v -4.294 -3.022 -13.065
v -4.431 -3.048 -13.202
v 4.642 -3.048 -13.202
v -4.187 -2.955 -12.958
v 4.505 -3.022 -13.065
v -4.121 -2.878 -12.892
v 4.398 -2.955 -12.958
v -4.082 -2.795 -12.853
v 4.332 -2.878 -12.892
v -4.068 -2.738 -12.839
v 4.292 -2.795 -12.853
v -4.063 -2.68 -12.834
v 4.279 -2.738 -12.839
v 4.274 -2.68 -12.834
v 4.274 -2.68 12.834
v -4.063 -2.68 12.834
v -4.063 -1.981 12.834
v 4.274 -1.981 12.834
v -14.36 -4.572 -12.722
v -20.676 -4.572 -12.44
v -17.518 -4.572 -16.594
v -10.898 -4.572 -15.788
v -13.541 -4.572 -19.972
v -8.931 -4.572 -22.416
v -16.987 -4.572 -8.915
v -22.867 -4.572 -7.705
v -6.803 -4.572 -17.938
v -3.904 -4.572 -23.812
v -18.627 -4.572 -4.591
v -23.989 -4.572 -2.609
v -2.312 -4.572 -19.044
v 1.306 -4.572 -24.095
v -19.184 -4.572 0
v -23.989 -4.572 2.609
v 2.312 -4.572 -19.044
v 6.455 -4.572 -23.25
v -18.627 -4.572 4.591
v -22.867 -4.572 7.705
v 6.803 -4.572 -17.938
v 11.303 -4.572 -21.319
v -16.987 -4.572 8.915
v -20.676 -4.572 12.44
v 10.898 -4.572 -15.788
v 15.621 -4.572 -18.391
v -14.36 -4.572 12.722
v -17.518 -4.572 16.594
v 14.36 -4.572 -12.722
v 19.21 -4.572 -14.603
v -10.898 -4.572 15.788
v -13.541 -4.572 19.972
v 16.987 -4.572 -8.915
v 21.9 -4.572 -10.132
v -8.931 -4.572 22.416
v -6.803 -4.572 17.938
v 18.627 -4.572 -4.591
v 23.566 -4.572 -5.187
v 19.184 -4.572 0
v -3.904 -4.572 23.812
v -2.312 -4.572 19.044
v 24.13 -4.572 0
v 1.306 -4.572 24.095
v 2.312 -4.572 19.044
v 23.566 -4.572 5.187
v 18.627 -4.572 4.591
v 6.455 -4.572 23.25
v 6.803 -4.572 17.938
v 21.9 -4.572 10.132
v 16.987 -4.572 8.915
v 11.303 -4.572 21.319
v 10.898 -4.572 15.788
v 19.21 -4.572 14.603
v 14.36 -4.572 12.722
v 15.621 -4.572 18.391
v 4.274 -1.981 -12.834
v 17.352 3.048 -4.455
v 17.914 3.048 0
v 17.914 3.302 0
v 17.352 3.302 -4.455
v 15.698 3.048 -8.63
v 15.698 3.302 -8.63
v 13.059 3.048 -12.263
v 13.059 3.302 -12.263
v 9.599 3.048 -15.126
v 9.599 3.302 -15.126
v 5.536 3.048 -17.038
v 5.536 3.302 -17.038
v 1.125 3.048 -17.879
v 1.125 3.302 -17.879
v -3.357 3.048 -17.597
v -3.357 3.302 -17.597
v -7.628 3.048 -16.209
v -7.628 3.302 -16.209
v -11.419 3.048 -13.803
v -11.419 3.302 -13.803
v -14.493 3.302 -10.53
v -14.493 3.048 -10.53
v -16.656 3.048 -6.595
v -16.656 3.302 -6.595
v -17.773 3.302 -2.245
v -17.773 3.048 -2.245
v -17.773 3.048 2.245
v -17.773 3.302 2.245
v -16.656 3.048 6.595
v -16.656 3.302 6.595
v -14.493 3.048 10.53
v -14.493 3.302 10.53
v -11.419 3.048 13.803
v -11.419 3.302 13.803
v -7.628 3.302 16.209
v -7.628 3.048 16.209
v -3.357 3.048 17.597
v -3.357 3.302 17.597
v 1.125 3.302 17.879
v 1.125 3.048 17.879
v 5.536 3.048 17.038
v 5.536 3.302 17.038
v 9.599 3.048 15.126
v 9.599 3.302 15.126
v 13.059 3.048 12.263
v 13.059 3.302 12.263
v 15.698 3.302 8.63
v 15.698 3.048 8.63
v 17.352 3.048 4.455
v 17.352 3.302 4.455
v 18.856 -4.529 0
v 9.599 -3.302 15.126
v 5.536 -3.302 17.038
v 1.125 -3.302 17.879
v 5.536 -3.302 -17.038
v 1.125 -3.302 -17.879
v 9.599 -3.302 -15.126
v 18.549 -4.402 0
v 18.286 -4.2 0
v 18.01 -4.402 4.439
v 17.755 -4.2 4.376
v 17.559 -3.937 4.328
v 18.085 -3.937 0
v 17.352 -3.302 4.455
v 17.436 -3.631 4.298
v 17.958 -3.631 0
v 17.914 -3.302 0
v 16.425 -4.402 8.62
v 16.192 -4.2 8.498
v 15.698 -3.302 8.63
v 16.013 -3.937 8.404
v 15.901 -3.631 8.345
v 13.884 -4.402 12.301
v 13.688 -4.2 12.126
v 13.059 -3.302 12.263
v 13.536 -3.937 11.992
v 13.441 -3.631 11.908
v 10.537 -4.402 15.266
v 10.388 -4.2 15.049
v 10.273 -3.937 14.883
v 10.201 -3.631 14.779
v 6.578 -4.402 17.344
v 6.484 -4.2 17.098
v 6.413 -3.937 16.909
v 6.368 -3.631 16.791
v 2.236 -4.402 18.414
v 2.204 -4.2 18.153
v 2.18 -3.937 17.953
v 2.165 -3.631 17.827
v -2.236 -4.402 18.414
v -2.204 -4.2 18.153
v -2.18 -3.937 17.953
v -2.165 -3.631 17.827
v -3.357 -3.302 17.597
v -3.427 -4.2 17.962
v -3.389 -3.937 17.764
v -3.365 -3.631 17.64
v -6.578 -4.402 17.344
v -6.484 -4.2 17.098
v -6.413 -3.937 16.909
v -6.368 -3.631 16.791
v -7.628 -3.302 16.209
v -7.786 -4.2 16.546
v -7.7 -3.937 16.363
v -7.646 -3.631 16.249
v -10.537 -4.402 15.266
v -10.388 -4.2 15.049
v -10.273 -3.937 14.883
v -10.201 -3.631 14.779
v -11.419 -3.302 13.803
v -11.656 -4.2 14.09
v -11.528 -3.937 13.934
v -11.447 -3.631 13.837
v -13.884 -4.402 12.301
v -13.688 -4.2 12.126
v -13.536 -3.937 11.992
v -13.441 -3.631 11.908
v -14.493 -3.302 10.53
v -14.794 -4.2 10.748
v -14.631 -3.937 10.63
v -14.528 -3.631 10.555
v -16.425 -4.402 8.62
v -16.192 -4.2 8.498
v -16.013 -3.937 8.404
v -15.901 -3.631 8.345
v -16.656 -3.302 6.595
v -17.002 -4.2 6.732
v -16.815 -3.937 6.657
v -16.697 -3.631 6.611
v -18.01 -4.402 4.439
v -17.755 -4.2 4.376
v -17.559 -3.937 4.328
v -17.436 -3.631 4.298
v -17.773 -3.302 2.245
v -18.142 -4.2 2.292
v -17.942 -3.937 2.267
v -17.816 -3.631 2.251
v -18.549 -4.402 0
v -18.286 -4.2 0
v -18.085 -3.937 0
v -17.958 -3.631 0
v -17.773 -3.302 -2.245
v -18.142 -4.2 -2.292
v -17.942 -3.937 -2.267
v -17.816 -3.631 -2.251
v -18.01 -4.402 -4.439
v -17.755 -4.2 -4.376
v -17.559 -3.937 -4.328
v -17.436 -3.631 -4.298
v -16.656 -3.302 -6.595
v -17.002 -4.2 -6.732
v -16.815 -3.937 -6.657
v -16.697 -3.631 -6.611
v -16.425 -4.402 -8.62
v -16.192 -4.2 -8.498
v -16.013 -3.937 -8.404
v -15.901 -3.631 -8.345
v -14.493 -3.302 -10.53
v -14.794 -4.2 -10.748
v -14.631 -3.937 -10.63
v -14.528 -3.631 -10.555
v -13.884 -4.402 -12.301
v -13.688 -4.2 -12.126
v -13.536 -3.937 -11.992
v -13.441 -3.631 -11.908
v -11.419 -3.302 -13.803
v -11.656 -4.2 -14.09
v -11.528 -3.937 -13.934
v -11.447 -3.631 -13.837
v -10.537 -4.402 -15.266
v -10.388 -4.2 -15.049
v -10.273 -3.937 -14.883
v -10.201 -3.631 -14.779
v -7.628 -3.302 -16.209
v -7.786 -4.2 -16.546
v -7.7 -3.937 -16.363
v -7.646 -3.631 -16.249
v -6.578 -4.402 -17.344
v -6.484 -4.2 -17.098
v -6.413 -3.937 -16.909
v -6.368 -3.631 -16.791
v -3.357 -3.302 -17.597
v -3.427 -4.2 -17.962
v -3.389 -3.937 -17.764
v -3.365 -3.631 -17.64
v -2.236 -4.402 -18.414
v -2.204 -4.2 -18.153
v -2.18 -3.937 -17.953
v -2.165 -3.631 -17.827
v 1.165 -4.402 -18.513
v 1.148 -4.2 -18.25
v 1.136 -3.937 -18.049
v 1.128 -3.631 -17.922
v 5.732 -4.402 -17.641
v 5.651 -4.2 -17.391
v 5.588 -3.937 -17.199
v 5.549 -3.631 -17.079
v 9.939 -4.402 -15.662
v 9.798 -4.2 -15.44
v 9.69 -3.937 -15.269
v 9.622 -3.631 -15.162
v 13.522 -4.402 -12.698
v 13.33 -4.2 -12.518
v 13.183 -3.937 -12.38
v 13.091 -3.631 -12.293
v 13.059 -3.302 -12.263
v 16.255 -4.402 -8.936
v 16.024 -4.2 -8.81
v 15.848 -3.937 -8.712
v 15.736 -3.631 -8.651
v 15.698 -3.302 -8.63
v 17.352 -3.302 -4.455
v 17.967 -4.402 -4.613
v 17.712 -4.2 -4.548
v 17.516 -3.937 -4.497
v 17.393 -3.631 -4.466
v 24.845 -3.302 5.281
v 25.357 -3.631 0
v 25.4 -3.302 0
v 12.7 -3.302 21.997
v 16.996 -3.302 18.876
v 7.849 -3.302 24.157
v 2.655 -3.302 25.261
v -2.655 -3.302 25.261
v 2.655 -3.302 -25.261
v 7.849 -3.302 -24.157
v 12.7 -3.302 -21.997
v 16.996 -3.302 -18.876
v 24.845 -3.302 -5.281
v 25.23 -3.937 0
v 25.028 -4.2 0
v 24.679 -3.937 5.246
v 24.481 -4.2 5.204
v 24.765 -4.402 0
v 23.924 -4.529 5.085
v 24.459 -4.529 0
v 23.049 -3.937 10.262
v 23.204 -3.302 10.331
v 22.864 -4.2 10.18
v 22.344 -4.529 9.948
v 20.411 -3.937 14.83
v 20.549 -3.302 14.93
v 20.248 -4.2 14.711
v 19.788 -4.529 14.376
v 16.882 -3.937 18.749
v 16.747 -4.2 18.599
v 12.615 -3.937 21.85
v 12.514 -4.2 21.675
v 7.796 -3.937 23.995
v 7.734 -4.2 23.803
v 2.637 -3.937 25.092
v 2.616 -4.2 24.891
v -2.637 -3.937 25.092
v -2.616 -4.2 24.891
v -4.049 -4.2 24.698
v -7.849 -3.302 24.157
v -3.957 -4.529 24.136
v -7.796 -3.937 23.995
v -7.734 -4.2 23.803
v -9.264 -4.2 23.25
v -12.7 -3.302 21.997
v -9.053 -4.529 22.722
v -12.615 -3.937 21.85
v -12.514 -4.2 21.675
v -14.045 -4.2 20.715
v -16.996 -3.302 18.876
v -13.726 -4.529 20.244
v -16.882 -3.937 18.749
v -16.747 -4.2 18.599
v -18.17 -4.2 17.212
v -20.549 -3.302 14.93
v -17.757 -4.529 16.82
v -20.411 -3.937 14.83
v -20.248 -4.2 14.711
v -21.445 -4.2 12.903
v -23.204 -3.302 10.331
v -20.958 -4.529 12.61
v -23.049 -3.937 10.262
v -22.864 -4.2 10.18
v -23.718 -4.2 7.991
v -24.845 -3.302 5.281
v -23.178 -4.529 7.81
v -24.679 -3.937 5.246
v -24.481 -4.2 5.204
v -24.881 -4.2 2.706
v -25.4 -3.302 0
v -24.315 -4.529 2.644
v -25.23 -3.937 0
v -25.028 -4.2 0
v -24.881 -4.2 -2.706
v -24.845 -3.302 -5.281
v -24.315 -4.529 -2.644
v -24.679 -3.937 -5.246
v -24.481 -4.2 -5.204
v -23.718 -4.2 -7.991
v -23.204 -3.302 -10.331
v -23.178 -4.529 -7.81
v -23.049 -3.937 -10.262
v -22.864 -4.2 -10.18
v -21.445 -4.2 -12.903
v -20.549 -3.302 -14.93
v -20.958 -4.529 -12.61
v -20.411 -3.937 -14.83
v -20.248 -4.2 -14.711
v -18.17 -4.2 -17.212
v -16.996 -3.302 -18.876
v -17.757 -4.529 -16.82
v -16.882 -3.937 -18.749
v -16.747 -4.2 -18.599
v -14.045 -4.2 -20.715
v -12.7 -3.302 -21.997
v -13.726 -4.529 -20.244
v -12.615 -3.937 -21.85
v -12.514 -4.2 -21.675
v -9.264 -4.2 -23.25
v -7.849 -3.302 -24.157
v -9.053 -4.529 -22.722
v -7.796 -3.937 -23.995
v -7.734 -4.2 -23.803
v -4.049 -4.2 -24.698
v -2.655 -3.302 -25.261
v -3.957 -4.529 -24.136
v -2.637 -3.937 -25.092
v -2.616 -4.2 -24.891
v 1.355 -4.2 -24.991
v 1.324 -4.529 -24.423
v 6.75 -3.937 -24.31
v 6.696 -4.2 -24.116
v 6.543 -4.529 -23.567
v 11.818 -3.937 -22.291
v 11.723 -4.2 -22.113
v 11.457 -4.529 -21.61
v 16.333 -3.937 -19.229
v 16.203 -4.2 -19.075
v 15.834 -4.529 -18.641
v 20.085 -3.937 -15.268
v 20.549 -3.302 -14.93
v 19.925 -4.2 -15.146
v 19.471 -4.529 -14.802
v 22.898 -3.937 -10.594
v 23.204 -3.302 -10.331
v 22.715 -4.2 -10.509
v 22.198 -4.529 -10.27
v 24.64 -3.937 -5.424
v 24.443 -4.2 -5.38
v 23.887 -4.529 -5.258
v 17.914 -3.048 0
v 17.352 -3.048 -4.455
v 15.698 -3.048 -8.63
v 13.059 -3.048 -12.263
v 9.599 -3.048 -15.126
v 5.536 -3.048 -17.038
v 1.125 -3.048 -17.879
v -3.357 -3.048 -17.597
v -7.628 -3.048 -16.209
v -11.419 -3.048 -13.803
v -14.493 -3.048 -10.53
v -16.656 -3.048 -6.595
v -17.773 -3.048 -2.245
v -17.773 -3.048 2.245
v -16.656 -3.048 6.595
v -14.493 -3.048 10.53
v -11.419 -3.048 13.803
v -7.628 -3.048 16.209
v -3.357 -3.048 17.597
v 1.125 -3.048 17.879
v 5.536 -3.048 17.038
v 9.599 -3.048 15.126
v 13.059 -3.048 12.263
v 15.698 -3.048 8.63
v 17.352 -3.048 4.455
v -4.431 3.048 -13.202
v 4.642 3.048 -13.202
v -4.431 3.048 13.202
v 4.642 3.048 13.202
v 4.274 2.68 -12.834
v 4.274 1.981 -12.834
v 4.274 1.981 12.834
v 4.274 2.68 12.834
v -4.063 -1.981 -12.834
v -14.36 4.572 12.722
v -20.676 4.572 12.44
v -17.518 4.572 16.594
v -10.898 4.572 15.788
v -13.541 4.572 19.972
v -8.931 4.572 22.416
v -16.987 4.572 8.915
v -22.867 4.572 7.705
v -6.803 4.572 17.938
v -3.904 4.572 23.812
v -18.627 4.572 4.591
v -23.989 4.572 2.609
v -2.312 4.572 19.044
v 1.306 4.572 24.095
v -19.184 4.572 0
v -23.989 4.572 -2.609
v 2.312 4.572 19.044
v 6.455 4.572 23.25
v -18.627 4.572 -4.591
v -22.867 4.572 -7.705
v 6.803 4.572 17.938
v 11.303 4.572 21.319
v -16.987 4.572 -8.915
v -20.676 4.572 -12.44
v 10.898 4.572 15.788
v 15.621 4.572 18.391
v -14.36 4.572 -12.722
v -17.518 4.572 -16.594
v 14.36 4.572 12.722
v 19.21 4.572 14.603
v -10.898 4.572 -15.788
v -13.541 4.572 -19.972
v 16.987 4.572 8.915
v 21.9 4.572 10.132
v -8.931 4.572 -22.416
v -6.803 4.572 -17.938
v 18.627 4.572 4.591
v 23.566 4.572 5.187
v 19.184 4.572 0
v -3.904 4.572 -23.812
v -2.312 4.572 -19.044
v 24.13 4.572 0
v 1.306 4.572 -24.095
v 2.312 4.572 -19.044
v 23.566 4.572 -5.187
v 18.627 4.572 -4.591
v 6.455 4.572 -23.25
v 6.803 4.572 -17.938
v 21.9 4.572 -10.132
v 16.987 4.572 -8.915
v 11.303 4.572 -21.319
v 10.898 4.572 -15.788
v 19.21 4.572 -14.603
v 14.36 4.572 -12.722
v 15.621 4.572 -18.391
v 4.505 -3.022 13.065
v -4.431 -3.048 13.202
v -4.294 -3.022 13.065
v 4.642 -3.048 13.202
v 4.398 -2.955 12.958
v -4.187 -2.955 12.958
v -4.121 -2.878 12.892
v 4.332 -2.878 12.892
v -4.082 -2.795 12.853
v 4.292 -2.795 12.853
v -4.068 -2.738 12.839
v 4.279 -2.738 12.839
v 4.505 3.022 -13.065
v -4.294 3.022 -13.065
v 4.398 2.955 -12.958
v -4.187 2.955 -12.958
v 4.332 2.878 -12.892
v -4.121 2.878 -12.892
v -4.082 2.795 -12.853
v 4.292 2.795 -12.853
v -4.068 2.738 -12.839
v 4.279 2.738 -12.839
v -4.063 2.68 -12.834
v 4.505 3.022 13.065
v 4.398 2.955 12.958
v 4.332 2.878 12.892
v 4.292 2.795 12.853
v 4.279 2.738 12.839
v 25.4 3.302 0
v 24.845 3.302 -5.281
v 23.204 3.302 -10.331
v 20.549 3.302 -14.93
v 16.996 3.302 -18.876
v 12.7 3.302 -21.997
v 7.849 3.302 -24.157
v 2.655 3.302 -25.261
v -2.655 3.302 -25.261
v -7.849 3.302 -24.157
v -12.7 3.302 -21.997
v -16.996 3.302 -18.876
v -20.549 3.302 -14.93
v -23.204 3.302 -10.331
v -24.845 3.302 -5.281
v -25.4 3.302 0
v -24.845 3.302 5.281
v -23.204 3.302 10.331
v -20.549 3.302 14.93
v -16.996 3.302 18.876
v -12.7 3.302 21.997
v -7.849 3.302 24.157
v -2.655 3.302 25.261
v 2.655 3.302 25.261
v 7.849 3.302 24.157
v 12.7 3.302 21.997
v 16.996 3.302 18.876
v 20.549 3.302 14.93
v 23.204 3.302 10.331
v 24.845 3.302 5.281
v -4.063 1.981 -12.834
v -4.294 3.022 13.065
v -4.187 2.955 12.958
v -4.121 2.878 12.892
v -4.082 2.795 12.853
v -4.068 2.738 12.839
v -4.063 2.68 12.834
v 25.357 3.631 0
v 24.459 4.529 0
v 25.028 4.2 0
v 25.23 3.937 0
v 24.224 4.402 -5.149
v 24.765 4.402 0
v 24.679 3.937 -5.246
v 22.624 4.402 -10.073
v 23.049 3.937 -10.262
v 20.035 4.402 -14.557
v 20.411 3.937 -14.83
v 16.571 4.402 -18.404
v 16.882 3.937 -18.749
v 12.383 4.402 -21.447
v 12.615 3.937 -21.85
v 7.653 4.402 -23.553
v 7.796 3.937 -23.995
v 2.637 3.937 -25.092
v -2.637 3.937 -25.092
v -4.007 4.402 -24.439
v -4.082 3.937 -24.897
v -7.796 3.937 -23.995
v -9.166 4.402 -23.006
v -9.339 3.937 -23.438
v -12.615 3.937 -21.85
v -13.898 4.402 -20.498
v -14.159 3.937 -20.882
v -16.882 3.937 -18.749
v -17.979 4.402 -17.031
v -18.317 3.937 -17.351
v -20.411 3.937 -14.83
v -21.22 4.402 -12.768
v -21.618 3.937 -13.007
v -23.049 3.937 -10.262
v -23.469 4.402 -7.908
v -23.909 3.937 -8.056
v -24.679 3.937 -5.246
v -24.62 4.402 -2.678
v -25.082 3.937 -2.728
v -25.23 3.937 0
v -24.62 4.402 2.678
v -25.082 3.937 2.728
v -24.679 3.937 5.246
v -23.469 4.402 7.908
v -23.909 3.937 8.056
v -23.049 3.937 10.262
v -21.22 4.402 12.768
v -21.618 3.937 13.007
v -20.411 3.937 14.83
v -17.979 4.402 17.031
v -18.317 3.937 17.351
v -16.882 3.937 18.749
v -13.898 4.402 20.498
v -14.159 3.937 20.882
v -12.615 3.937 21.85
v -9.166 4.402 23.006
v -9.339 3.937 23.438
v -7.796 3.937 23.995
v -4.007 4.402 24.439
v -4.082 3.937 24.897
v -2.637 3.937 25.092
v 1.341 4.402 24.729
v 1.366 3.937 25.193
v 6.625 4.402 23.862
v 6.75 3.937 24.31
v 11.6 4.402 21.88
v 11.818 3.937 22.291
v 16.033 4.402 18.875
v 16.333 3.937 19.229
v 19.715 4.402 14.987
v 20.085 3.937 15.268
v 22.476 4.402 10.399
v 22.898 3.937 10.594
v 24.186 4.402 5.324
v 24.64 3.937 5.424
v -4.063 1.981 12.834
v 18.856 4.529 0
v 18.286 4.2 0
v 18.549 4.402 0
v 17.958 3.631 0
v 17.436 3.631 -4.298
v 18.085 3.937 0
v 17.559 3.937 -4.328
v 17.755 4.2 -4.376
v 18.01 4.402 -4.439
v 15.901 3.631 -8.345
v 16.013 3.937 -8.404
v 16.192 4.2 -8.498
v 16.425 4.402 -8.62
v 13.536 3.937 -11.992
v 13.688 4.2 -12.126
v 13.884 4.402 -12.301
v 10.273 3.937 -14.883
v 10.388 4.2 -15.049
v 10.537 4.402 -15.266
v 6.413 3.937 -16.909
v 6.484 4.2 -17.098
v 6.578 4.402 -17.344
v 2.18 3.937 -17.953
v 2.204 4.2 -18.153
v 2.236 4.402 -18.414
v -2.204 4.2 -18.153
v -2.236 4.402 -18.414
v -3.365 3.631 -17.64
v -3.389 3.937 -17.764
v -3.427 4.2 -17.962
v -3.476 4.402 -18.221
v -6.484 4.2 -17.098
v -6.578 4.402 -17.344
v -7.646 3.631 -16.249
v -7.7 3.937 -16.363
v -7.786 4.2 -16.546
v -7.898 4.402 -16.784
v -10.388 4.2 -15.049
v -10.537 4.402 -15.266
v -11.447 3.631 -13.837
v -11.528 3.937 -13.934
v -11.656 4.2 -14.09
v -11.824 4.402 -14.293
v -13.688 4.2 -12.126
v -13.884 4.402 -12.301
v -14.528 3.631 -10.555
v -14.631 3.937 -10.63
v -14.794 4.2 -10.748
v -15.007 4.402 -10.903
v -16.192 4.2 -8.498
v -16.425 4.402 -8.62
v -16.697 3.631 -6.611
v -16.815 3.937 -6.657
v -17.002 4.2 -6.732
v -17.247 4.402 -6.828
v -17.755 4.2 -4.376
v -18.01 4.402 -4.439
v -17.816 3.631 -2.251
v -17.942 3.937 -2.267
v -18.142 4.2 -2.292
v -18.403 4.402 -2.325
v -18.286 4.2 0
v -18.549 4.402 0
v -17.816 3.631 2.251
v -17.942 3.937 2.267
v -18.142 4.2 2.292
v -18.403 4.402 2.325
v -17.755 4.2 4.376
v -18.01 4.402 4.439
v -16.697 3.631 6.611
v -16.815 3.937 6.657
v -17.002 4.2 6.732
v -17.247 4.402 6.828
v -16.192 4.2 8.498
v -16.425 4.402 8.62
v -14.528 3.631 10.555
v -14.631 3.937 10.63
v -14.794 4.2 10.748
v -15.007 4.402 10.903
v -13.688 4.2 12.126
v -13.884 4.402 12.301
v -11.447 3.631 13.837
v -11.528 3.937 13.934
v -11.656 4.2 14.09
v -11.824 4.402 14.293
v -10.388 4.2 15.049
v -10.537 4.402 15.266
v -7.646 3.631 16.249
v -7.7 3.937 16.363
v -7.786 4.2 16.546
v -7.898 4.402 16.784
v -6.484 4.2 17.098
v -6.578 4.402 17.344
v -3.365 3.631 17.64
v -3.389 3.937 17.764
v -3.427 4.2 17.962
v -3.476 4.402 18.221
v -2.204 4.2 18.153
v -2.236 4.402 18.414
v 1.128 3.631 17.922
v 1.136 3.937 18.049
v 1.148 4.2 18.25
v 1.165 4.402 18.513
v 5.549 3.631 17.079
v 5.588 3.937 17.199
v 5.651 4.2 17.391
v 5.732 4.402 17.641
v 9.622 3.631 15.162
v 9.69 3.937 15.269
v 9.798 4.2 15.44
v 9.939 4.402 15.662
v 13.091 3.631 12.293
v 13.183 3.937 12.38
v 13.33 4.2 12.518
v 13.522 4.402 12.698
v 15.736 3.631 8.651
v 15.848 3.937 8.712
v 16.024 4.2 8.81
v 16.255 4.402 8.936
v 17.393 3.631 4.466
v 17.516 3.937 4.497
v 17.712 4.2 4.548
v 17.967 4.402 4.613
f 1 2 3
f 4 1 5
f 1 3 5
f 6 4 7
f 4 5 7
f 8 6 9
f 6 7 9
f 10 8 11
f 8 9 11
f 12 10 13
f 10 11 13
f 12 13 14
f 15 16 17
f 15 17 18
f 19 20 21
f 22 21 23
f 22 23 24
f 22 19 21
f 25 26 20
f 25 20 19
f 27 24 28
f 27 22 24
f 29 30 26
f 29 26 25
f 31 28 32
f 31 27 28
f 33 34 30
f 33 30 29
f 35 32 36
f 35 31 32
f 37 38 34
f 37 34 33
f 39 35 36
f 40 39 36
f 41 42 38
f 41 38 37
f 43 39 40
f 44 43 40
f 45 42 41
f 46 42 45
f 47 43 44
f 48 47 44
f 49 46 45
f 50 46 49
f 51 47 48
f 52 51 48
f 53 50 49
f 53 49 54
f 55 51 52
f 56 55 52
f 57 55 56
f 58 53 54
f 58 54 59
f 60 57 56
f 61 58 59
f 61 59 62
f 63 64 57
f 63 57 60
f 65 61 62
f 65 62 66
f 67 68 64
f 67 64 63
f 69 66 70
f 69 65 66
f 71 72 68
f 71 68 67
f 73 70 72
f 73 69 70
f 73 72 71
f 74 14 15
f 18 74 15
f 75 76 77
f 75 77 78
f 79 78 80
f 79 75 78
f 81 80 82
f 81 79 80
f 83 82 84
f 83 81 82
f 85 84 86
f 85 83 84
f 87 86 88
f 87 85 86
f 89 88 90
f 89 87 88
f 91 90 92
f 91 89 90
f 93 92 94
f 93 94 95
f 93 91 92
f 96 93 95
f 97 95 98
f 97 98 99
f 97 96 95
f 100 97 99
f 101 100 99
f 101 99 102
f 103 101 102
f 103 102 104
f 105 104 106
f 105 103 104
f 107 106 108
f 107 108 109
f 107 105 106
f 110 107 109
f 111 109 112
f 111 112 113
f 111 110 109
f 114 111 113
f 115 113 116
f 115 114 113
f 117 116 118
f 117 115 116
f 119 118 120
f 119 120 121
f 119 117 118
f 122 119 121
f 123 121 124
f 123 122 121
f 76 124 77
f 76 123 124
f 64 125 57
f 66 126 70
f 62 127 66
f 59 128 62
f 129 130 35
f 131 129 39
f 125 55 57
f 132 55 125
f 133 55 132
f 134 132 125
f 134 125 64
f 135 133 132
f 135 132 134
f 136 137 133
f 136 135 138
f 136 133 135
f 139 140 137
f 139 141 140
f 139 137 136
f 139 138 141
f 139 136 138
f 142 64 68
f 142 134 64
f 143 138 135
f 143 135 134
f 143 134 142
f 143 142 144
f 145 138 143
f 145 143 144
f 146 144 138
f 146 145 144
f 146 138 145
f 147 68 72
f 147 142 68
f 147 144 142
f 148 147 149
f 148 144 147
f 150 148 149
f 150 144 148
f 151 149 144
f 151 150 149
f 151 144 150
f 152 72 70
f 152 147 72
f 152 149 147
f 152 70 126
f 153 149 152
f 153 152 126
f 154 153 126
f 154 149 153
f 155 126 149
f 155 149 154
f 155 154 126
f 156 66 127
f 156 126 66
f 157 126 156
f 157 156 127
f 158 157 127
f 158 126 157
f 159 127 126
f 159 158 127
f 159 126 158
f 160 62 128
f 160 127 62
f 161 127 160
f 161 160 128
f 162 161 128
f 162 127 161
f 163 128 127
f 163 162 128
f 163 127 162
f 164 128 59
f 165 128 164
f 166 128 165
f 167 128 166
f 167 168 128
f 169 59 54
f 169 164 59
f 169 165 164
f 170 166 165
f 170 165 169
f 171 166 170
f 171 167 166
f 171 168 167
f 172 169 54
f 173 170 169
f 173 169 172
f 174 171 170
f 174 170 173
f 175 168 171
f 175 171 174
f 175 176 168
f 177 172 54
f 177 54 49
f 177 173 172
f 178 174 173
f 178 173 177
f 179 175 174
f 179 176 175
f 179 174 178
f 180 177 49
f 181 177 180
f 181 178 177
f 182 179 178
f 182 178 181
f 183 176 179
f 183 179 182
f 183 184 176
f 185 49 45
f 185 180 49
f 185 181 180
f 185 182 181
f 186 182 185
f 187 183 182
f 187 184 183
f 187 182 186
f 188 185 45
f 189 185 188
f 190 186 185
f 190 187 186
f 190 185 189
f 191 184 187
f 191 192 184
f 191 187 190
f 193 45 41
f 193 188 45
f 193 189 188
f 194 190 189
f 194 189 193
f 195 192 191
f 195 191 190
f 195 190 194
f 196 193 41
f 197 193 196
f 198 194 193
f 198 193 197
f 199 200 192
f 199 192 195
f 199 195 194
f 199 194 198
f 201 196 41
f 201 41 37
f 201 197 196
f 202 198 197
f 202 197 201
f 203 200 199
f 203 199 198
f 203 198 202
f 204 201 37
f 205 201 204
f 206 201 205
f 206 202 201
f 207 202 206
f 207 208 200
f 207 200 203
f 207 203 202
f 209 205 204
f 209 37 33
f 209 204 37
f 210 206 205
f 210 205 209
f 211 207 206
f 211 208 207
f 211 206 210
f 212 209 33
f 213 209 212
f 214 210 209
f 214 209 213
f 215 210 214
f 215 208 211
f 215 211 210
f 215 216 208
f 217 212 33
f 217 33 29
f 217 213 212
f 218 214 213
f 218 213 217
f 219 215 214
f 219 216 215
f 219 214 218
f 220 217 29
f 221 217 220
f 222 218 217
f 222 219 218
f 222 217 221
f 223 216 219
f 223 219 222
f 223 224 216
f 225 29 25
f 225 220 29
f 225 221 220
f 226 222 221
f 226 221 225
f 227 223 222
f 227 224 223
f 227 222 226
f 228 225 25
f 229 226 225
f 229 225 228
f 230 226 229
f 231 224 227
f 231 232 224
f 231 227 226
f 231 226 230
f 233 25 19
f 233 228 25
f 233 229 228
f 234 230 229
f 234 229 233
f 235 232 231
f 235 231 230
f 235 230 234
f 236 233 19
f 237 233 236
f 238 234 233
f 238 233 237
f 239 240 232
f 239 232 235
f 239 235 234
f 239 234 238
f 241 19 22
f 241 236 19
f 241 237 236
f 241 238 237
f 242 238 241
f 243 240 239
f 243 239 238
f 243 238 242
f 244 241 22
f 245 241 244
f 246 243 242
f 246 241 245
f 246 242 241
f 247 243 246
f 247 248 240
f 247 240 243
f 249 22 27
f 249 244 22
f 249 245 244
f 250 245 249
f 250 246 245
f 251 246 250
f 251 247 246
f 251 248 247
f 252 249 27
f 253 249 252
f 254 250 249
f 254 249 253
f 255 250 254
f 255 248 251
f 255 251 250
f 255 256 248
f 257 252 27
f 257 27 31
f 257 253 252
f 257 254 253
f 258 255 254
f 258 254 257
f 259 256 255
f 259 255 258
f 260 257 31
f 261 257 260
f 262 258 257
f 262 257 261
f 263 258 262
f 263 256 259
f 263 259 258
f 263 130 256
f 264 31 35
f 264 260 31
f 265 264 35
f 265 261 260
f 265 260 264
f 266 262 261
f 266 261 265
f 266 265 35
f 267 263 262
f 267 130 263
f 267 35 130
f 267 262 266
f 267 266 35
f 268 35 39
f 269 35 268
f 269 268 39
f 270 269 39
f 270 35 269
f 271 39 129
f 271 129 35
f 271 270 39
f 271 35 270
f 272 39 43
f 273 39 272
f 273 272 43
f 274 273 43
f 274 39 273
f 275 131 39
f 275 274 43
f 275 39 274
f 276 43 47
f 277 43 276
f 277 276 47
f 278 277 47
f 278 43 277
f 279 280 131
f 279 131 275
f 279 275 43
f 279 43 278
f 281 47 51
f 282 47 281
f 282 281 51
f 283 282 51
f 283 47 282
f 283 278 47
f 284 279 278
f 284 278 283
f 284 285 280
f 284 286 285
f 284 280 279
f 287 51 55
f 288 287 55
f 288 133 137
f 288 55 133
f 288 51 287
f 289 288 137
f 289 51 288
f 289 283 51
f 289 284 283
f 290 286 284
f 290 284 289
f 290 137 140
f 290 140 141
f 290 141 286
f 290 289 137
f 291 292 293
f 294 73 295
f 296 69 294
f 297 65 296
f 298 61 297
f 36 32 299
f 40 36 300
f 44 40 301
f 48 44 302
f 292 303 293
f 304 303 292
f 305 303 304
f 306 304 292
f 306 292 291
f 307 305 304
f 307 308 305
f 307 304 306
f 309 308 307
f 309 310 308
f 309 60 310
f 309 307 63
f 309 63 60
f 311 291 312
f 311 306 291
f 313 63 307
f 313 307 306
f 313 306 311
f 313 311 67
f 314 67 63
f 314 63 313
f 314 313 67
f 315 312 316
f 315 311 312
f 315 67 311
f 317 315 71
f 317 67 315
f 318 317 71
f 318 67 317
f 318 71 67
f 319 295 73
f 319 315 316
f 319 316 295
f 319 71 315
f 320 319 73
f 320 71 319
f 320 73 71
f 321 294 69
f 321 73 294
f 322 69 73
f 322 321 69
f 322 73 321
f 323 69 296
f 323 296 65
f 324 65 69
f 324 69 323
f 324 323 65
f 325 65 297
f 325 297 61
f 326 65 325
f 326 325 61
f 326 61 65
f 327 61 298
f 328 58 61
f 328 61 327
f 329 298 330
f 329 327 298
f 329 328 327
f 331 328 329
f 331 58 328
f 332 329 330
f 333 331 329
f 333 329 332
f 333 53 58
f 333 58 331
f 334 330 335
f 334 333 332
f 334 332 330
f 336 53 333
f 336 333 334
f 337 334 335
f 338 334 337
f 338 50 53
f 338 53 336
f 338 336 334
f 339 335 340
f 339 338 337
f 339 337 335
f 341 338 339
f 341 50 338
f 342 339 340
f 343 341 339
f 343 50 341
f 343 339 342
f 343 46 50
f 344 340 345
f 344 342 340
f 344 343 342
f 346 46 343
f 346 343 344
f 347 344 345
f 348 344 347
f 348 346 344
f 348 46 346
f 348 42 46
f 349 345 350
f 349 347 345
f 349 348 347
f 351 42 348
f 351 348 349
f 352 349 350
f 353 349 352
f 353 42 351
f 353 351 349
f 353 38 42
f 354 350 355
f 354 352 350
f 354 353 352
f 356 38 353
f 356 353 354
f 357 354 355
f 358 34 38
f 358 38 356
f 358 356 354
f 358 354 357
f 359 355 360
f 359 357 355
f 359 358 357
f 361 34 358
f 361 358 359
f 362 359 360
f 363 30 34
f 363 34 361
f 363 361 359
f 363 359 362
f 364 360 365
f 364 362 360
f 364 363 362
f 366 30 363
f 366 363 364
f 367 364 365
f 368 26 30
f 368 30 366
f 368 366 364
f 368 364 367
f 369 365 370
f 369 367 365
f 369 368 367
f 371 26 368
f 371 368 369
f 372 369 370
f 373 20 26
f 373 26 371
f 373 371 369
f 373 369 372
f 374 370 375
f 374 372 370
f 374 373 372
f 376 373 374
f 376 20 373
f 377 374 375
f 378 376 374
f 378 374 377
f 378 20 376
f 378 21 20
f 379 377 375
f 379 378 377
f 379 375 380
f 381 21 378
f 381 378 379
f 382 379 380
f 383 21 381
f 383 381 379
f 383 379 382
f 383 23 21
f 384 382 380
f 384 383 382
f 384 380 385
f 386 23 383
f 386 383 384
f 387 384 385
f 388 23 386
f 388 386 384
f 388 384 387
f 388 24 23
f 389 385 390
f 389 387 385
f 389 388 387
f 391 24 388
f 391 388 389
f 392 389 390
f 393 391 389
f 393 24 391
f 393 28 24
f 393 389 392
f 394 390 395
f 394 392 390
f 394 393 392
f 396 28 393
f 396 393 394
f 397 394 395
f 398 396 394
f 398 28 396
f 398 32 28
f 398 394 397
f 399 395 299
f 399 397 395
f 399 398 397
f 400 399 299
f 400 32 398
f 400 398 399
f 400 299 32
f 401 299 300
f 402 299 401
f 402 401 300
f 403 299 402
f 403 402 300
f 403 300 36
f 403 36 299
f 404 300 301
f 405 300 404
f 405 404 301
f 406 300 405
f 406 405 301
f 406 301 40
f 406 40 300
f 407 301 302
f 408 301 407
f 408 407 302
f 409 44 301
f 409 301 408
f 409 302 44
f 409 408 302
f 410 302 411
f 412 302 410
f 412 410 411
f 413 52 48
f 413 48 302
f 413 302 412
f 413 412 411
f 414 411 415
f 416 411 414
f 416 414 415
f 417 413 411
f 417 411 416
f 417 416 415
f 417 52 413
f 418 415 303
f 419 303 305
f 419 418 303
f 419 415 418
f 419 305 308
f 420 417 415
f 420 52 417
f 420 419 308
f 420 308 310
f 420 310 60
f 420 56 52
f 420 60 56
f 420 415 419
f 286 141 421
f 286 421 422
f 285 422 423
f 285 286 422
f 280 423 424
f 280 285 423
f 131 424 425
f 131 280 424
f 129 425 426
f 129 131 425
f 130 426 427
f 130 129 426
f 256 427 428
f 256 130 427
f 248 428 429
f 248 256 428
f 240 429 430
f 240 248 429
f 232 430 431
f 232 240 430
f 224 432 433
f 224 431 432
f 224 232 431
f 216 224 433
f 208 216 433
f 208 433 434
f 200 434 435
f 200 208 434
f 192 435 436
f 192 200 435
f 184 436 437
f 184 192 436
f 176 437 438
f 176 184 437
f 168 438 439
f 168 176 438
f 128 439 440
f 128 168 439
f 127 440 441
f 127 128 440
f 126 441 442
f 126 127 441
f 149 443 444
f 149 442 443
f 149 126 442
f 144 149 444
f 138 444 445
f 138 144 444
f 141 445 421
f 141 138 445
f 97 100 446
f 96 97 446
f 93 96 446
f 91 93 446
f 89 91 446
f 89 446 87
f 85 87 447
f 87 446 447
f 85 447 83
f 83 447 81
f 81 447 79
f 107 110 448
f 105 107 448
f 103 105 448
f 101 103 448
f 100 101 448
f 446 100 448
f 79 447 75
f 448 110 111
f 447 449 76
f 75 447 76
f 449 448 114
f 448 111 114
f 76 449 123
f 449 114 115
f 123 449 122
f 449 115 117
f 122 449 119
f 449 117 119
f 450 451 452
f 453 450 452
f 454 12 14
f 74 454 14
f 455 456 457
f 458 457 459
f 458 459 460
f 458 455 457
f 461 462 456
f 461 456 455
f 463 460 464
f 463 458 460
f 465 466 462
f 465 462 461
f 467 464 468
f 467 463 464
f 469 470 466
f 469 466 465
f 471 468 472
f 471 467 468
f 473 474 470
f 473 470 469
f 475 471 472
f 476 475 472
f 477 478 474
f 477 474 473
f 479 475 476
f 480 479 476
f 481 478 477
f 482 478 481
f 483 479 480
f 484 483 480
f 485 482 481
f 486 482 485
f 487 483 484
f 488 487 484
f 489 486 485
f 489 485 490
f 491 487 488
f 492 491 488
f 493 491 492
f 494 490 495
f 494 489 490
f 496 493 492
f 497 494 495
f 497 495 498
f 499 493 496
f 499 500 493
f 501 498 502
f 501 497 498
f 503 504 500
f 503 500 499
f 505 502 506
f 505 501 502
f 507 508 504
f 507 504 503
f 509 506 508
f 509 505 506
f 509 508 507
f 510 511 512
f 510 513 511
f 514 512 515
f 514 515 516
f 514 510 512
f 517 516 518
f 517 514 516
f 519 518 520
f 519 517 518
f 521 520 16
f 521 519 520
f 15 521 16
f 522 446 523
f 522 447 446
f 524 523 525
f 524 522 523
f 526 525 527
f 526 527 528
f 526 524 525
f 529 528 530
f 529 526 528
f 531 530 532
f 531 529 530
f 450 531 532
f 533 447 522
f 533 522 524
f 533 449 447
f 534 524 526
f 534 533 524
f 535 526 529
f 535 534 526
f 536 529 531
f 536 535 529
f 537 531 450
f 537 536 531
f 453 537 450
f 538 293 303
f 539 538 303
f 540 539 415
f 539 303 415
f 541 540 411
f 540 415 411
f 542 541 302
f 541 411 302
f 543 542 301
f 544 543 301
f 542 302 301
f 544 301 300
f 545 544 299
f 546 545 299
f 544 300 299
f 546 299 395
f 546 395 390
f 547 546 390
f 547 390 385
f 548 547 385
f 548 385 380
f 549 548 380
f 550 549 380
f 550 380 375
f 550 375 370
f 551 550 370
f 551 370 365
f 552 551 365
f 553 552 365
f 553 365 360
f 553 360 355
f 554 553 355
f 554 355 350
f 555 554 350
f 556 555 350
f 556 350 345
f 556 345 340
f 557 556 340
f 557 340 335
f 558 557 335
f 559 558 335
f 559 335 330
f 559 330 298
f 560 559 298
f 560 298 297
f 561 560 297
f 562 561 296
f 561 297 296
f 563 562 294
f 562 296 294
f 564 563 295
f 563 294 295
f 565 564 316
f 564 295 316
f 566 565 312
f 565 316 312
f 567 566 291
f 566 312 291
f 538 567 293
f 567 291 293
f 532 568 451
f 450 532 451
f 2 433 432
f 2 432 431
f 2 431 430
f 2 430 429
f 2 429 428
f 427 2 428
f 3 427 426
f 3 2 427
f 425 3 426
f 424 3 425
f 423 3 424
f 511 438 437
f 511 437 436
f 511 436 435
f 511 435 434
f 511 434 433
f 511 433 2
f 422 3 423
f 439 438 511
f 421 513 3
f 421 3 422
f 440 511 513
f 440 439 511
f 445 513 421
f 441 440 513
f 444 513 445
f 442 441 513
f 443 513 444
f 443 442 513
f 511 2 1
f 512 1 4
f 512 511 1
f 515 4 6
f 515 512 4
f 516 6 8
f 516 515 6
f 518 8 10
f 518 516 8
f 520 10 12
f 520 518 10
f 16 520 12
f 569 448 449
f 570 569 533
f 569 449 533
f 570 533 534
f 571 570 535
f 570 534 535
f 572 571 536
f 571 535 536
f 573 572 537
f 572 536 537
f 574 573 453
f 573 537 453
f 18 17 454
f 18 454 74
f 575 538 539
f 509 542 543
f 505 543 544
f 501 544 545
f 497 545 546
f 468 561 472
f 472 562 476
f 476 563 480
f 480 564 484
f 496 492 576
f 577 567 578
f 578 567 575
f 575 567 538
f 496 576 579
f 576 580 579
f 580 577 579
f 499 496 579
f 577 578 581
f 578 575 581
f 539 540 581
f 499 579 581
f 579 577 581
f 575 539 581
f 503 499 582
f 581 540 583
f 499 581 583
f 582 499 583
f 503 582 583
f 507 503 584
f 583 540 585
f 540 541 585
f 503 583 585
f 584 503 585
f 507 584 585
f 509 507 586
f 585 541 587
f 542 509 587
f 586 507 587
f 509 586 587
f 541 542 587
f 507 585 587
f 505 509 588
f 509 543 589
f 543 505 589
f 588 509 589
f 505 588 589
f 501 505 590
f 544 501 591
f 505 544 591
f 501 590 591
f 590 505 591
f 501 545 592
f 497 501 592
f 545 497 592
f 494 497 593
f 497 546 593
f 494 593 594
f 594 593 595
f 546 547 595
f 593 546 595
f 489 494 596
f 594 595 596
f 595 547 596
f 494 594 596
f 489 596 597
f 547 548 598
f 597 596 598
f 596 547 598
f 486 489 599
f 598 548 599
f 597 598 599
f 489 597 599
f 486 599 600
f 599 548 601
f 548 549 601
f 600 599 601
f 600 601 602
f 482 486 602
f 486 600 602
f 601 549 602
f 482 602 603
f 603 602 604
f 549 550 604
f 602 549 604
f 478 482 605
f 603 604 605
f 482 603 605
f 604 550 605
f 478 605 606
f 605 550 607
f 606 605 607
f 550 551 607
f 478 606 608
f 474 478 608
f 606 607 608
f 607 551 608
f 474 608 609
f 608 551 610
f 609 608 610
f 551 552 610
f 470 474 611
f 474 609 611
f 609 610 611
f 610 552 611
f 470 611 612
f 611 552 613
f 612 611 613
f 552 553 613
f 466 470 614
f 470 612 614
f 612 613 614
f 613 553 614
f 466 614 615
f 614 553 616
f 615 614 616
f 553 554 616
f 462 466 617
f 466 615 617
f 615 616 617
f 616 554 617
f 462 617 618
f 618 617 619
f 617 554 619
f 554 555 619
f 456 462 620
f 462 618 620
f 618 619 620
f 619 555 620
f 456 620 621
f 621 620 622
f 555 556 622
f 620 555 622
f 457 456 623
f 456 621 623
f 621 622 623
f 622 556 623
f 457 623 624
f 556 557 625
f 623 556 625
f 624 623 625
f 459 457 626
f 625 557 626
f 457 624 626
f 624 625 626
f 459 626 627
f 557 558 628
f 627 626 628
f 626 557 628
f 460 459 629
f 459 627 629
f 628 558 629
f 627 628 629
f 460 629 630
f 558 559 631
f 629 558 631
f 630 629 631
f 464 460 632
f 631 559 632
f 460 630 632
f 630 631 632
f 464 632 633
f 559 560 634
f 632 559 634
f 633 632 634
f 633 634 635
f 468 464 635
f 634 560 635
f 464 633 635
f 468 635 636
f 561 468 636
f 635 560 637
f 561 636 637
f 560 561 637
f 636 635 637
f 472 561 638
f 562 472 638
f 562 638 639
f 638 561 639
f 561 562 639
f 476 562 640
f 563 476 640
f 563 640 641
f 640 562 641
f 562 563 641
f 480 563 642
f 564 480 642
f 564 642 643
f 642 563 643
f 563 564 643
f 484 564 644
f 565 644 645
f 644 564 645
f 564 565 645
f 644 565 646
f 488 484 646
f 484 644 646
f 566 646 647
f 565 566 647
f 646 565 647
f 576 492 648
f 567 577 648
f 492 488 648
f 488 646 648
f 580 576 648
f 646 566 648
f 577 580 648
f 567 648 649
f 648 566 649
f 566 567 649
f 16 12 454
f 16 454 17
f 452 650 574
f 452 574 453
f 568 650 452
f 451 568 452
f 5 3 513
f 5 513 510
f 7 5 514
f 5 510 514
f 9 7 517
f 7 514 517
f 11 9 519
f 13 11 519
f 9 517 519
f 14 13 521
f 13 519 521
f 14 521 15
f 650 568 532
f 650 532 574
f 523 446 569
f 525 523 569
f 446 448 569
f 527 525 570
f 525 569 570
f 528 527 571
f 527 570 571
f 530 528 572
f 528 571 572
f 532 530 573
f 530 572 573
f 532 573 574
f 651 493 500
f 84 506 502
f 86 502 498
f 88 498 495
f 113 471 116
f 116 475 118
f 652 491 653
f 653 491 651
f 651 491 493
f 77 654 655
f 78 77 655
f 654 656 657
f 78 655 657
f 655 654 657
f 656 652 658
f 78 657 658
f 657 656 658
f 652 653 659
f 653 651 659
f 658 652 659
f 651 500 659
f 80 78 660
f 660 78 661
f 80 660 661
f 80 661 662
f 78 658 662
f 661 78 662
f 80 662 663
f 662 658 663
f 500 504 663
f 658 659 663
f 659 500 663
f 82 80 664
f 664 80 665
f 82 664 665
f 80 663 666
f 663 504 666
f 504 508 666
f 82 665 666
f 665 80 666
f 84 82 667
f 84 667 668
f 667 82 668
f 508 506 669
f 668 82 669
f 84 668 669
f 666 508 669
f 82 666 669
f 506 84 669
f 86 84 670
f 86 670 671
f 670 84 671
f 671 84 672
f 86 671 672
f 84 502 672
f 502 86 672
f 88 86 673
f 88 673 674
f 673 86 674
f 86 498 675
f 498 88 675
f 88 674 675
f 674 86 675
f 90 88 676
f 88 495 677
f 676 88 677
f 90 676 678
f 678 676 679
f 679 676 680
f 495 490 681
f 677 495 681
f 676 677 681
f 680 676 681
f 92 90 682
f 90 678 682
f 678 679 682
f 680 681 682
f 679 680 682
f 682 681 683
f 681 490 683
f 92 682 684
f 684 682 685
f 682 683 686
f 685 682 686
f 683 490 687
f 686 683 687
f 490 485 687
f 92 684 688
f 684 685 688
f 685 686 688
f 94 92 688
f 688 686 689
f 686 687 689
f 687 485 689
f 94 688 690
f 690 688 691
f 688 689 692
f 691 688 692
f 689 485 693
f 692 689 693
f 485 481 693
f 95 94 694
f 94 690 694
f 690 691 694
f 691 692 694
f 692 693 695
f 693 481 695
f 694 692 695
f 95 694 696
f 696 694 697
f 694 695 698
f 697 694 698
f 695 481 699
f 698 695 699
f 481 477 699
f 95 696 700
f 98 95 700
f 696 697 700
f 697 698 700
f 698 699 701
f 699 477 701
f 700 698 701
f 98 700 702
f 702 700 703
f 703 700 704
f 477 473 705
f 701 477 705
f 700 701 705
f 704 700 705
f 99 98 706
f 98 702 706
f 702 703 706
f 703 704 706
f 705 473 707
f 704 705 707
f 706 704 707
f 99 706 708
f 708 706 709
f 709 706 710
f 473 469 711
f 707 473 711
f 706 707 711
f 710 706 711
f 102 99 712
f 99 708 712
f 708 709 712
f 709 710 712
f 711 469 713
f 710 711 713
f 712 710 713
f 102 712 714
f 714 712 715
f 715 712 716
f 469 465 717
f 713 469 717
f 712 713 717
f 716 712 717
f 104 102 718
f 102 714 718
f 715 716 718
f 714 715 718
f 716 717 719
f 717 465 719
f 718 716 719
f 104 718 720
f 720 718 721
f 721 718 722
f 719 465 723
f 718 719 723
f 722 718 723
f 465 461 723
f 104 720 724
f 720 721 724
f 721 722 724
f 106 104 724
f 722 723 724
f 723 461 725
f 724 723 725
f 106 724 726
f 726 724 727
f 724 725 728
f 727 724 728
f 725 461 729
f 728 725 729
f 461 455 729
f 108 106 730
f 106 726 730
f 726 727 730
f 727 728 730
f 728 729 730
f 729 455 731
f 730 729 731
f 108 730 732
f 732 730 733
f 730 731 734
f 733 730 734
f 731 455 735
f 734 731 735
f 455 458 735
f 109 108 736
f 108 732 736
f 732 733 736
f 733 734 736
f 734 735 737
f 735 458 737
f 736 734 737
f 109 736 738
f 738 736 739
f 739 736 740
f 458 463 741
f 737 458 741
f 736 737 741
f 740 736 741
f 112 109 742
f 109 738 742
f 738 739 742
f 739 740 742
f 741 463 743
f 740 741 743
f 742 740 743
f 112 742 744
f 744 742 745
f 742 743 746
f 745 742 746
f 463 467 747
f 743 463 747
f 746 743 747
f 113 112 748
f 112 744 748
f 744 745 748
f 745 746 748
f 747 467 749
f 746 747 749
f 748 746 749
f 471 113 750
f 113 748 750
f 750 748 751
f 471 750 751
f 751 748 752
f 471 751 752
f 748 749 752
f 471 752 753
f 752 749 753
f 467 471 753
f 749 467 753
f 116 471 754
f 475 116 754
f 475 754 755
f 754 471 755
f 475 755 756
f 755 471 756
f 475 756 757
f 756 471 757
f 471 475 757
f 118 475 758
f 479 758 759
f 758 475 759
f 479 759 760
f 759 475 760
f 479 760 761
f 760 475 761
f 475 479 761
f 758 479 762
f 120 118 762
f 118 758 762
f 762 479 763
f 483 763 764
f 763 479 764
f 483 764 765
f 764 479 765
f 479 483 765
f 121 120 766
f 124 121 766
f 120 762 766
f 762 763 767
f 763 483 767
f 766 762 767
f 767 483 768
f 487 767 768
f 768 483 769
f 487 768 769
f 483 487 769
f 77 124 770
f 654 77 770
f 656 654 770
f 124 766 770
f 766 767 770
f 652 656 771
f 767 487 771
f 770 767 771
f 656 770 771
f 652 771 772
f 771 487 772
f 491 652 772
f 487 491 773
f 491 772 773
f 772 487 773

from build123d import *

# Parameters (mm, degrees)
F0_R        = 25.4
F0_R_2      = 17.914362
F1_DEPTH    = 4.572
F1_FACE_R   = 25.4
F1_FACE_R_2 = 17.914362
F2_DEPTH    = 4.572
F0_W        = 8.337361
F0_H        = 25.668724
F3_DEPTH    = 3.048
F4_DEPTH    = 3.048
F5_DEPTH    = 1.9812
F6_DEPTH    = 1.9812
F7_R        = 1.27
F8_R        = 0.367926


with BuildPart() as f1:
    # F0 (on Front) → F1 (new body)
    with BuildSketch(Plane.XZ):
        Circle(F0_R)
        Circle(F0_R_2, mode=Mode.SUBTRACT)
    extrude(amount=F1_DEPTH)

    # F1_face (on face) → F2 (join)
    with BuildSketch(Plane(origin=(0, 0, 0), x_dir=(1, 0, 0), z_dir=(0, 1, 0))):
        Circle(F1_FACE_R)
        Circle(F1_FACE_R_2, mode=Mode.SUBTRACT)
    extrude(amount=F2_DEPTH)

    # F0 (on Front) → F3 (join)
    with BuildSketch(Plane.XZ):
        Circle(F0_R_2)
        with Locations((0.105467, 0)):
            Rectangle(F0_W, F0_H, mode=Mode.SUBTRACT)
    extrude(amount=F3_DEPTH)

    # F0 (on Front) → F4 (join)
    with BuildSketch(Plane.XZ):
        Circle(F0_R_2)
        with Locations((0.105467, 0)):
            Rectangle(F0_W, F0_H, mode=Mode.SUBTRACT)
    extrude(amount=-F4_DEPTH)

    # F0 (on Front) → F5 (join)
    with BuildSketch(Plane.XZ):
        with Locations((0.105467, 0)):
            Rectangle(F0_W, F0_H)
    extrude(amount=F5_DEPTH)

    # F0 (on Front) → F6 (join)
    with BuildSketch(Plane.XZ):
        with Locations((0.105467, 0)):
            Rectangle(F0_W, F0_H)
    extrude(amount=-F6_DEPTH)

    # F7
    f7_edges = [f1.edges().sort_by_distance(p)[0] for p in [
        (-17.914362, 4.572, 0),
        (-25.4, 4.572, 0),
        (-25.4, -4.572, 0),
        (-17.914362, -4.572, 0),
    ]]
    fillet(f7_edges, radius=F7_R)

    # F8
    f8_edges = [f1.edges().sort_by_distance(p)[0] for p in [
        (0.105468, 3.048, -12.834362),
        (4.274148, 3.048, 0),
        (0.105468, 3.048, 12.834362),
        (-4.063213, 3.048, 0),
        (-4.063213, -3.048, 0),
        (0.105468, -3.048, 12.834362),
        (4.274148, -3.048, 0),
        (0.105468, -3.048, -12.834362),
    ]]
    fillet(f8_edges, radius=F8_R)


solid = f1.part
